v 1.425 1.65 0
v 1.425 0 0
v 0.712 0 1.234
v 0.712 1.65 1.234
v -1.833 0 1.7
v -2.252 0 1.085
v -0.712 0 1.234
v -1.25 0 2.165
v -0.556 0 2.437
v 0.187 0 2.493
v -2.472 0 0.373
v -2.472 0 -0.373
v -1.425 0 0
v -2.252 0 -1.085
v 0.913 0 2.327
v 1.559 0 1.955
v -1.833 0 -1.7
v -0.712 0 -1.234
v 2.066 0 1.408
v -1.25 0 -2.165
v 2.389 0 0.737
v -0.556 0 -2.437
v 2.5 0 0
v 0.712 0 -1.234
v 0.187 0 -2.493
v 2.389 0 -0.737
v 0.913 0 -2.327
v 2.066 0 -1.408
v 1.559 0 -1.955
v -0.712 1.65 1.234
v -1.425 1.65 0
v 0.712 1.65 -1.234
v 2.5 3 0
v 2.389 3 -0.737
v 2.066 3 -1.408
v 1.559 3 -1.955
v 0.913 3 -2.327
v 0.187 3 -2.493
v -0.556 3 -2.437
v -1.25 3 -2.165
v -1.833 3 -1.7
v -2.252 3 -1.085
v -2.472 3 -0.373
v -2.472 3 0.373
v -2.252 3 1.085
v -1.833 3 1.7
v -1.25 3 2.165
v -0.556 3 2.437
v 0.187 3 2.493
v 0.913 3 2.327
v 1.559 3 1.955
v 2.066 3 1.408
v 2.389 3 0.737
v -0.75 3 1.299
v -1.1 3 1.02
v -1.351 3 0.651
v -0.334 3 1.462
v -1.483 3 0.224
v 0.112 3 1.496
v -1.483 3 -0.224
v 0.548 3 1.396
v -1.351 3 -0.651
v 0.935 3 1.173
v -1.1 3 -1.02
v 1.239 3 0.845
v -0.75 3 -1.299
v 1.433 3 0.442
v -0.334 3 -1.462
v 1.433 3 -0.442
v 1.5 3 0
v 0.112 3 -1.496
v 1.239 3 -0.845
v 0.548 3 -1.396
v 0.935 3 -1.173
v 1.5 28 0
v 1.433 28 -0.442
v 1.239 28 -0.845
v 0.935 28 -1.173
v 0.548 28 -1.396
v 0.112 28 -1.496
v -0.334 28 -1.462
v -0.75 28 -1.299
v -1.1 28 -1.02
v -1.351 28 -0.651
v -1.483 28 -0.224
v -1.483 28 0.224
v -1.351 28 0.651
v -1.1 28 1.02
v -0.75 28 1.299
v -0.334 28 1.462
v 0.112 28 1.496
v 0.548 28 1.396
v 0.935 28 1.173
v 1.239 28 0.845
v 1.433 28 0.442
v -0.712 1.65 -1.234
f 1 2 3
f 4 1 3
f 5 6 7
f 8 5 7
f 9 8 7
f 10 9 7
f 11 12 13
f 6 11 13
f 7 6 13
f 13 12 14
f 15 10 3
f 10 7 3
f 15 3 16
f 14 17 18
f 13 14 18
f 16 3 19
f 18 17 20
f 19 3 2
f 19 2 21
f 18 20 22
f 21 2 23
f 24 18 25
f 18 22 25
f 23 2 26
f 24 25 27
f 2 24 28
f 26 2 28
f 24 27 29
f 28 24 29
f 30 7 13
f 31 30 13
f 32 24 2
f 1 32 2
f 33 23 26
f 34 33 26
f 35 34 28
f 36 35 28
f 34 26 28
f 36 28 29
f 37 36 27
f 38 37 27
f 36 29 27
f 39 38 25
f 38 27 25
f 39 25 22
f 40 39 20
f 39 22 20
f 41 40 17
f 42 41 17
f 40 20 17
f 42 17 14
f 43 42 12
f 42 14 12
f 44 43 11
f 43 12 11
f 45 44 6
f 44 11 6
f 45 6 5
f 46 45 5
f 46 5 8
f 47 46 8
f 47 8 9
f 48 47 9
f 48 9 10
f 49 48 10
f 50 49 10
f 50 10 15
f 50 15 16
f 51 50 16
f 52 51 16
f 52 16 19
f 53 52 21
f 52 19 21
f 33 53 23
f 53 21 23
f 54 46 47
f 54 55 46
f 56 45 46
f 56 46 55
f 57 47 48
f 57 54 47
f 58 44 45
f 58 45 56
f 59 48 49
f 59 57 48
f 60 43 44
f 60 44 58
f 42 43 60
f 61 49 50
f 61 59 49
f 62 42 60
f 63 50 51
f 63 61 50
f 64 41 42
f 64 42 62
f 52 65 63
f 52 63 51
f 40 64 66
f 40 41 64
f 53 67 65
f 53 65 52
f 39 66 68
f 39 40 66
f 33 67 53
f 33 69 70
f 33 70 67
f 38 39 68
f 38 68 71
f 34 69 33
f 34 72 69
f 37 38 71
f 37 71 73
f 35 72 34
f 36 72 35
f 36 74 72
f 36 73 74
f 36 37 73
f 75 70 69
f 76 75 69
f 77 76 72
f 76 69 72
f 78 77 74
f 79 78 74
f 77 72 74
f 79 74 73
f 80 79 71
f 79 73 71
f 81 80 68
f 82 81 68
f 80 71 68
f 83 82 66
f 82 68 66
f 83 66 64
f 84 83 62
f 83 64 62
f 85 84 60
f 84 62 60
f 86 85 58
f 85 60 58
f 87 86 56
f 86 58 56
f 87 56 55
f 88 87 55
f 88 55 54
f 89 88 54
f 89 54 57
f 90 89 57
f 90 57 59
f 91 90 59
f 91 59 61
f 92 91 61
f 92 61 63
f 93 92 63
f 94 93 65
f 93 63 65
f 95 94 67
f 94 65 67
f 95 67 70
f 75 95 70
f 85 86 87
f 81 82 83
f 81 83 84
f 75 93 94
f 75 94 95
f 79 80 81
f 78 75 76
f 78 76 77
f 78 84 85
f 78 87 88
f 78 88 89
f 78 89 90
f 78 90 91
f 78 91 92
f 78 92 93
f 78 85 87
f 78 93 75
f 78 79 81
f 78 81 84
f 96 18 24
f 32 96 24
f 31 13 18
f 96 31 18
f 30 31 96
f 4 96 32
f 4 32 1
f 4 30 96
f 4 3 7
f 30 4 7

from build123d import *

# Parameters (mm, degrees)
SKETCH_1_R          = 2.5
EXTRUDE_1_DEPTH     = 3
SKETCH_2_R          = 1.5
EXTRUDE_2_DEPTH     = 25
CUT_EXTRUDE_1_DEPTH = 1.65


with BuildPart() as part:
    # 草图1 → 凸台-拉伸1 (new body)
    with BuildSketch(Plane(origin=(0, 0, 0), x_dir=(1, 0, 0), z_dir=(0, 1, 0))):
        Circle(SKETCH_1_R)
    extrude(amount=EXTRUDE_1_DEPTH)

    # 草图2 → 凸台-拉伸2 (add)
    with BuildSketch(Plane(origin=(0, 3, 0), x_dir=(1, 0, 0), z_dir=(0, 1, 0))):
        Circle(SKETCH_2_R)
    extrude(amount=EXTRUDE_2_DEPTH)

    # 草图3 → 切除-拉伸1 (cut)
    with BuildSketch(Plane.XZ):
        Polygon((1.425, 0), (0.7125, 1.2340862), (-0.7125, 1.2340862), (-1.425, 0), (-0.7125, -1.2340862), (0.7125, -1.2340862), align=None)
    extrude(amount=-CUT_EXTRUDE_1_DEPTH, mode=Mode.SUBTRACT)


solid = part.part
